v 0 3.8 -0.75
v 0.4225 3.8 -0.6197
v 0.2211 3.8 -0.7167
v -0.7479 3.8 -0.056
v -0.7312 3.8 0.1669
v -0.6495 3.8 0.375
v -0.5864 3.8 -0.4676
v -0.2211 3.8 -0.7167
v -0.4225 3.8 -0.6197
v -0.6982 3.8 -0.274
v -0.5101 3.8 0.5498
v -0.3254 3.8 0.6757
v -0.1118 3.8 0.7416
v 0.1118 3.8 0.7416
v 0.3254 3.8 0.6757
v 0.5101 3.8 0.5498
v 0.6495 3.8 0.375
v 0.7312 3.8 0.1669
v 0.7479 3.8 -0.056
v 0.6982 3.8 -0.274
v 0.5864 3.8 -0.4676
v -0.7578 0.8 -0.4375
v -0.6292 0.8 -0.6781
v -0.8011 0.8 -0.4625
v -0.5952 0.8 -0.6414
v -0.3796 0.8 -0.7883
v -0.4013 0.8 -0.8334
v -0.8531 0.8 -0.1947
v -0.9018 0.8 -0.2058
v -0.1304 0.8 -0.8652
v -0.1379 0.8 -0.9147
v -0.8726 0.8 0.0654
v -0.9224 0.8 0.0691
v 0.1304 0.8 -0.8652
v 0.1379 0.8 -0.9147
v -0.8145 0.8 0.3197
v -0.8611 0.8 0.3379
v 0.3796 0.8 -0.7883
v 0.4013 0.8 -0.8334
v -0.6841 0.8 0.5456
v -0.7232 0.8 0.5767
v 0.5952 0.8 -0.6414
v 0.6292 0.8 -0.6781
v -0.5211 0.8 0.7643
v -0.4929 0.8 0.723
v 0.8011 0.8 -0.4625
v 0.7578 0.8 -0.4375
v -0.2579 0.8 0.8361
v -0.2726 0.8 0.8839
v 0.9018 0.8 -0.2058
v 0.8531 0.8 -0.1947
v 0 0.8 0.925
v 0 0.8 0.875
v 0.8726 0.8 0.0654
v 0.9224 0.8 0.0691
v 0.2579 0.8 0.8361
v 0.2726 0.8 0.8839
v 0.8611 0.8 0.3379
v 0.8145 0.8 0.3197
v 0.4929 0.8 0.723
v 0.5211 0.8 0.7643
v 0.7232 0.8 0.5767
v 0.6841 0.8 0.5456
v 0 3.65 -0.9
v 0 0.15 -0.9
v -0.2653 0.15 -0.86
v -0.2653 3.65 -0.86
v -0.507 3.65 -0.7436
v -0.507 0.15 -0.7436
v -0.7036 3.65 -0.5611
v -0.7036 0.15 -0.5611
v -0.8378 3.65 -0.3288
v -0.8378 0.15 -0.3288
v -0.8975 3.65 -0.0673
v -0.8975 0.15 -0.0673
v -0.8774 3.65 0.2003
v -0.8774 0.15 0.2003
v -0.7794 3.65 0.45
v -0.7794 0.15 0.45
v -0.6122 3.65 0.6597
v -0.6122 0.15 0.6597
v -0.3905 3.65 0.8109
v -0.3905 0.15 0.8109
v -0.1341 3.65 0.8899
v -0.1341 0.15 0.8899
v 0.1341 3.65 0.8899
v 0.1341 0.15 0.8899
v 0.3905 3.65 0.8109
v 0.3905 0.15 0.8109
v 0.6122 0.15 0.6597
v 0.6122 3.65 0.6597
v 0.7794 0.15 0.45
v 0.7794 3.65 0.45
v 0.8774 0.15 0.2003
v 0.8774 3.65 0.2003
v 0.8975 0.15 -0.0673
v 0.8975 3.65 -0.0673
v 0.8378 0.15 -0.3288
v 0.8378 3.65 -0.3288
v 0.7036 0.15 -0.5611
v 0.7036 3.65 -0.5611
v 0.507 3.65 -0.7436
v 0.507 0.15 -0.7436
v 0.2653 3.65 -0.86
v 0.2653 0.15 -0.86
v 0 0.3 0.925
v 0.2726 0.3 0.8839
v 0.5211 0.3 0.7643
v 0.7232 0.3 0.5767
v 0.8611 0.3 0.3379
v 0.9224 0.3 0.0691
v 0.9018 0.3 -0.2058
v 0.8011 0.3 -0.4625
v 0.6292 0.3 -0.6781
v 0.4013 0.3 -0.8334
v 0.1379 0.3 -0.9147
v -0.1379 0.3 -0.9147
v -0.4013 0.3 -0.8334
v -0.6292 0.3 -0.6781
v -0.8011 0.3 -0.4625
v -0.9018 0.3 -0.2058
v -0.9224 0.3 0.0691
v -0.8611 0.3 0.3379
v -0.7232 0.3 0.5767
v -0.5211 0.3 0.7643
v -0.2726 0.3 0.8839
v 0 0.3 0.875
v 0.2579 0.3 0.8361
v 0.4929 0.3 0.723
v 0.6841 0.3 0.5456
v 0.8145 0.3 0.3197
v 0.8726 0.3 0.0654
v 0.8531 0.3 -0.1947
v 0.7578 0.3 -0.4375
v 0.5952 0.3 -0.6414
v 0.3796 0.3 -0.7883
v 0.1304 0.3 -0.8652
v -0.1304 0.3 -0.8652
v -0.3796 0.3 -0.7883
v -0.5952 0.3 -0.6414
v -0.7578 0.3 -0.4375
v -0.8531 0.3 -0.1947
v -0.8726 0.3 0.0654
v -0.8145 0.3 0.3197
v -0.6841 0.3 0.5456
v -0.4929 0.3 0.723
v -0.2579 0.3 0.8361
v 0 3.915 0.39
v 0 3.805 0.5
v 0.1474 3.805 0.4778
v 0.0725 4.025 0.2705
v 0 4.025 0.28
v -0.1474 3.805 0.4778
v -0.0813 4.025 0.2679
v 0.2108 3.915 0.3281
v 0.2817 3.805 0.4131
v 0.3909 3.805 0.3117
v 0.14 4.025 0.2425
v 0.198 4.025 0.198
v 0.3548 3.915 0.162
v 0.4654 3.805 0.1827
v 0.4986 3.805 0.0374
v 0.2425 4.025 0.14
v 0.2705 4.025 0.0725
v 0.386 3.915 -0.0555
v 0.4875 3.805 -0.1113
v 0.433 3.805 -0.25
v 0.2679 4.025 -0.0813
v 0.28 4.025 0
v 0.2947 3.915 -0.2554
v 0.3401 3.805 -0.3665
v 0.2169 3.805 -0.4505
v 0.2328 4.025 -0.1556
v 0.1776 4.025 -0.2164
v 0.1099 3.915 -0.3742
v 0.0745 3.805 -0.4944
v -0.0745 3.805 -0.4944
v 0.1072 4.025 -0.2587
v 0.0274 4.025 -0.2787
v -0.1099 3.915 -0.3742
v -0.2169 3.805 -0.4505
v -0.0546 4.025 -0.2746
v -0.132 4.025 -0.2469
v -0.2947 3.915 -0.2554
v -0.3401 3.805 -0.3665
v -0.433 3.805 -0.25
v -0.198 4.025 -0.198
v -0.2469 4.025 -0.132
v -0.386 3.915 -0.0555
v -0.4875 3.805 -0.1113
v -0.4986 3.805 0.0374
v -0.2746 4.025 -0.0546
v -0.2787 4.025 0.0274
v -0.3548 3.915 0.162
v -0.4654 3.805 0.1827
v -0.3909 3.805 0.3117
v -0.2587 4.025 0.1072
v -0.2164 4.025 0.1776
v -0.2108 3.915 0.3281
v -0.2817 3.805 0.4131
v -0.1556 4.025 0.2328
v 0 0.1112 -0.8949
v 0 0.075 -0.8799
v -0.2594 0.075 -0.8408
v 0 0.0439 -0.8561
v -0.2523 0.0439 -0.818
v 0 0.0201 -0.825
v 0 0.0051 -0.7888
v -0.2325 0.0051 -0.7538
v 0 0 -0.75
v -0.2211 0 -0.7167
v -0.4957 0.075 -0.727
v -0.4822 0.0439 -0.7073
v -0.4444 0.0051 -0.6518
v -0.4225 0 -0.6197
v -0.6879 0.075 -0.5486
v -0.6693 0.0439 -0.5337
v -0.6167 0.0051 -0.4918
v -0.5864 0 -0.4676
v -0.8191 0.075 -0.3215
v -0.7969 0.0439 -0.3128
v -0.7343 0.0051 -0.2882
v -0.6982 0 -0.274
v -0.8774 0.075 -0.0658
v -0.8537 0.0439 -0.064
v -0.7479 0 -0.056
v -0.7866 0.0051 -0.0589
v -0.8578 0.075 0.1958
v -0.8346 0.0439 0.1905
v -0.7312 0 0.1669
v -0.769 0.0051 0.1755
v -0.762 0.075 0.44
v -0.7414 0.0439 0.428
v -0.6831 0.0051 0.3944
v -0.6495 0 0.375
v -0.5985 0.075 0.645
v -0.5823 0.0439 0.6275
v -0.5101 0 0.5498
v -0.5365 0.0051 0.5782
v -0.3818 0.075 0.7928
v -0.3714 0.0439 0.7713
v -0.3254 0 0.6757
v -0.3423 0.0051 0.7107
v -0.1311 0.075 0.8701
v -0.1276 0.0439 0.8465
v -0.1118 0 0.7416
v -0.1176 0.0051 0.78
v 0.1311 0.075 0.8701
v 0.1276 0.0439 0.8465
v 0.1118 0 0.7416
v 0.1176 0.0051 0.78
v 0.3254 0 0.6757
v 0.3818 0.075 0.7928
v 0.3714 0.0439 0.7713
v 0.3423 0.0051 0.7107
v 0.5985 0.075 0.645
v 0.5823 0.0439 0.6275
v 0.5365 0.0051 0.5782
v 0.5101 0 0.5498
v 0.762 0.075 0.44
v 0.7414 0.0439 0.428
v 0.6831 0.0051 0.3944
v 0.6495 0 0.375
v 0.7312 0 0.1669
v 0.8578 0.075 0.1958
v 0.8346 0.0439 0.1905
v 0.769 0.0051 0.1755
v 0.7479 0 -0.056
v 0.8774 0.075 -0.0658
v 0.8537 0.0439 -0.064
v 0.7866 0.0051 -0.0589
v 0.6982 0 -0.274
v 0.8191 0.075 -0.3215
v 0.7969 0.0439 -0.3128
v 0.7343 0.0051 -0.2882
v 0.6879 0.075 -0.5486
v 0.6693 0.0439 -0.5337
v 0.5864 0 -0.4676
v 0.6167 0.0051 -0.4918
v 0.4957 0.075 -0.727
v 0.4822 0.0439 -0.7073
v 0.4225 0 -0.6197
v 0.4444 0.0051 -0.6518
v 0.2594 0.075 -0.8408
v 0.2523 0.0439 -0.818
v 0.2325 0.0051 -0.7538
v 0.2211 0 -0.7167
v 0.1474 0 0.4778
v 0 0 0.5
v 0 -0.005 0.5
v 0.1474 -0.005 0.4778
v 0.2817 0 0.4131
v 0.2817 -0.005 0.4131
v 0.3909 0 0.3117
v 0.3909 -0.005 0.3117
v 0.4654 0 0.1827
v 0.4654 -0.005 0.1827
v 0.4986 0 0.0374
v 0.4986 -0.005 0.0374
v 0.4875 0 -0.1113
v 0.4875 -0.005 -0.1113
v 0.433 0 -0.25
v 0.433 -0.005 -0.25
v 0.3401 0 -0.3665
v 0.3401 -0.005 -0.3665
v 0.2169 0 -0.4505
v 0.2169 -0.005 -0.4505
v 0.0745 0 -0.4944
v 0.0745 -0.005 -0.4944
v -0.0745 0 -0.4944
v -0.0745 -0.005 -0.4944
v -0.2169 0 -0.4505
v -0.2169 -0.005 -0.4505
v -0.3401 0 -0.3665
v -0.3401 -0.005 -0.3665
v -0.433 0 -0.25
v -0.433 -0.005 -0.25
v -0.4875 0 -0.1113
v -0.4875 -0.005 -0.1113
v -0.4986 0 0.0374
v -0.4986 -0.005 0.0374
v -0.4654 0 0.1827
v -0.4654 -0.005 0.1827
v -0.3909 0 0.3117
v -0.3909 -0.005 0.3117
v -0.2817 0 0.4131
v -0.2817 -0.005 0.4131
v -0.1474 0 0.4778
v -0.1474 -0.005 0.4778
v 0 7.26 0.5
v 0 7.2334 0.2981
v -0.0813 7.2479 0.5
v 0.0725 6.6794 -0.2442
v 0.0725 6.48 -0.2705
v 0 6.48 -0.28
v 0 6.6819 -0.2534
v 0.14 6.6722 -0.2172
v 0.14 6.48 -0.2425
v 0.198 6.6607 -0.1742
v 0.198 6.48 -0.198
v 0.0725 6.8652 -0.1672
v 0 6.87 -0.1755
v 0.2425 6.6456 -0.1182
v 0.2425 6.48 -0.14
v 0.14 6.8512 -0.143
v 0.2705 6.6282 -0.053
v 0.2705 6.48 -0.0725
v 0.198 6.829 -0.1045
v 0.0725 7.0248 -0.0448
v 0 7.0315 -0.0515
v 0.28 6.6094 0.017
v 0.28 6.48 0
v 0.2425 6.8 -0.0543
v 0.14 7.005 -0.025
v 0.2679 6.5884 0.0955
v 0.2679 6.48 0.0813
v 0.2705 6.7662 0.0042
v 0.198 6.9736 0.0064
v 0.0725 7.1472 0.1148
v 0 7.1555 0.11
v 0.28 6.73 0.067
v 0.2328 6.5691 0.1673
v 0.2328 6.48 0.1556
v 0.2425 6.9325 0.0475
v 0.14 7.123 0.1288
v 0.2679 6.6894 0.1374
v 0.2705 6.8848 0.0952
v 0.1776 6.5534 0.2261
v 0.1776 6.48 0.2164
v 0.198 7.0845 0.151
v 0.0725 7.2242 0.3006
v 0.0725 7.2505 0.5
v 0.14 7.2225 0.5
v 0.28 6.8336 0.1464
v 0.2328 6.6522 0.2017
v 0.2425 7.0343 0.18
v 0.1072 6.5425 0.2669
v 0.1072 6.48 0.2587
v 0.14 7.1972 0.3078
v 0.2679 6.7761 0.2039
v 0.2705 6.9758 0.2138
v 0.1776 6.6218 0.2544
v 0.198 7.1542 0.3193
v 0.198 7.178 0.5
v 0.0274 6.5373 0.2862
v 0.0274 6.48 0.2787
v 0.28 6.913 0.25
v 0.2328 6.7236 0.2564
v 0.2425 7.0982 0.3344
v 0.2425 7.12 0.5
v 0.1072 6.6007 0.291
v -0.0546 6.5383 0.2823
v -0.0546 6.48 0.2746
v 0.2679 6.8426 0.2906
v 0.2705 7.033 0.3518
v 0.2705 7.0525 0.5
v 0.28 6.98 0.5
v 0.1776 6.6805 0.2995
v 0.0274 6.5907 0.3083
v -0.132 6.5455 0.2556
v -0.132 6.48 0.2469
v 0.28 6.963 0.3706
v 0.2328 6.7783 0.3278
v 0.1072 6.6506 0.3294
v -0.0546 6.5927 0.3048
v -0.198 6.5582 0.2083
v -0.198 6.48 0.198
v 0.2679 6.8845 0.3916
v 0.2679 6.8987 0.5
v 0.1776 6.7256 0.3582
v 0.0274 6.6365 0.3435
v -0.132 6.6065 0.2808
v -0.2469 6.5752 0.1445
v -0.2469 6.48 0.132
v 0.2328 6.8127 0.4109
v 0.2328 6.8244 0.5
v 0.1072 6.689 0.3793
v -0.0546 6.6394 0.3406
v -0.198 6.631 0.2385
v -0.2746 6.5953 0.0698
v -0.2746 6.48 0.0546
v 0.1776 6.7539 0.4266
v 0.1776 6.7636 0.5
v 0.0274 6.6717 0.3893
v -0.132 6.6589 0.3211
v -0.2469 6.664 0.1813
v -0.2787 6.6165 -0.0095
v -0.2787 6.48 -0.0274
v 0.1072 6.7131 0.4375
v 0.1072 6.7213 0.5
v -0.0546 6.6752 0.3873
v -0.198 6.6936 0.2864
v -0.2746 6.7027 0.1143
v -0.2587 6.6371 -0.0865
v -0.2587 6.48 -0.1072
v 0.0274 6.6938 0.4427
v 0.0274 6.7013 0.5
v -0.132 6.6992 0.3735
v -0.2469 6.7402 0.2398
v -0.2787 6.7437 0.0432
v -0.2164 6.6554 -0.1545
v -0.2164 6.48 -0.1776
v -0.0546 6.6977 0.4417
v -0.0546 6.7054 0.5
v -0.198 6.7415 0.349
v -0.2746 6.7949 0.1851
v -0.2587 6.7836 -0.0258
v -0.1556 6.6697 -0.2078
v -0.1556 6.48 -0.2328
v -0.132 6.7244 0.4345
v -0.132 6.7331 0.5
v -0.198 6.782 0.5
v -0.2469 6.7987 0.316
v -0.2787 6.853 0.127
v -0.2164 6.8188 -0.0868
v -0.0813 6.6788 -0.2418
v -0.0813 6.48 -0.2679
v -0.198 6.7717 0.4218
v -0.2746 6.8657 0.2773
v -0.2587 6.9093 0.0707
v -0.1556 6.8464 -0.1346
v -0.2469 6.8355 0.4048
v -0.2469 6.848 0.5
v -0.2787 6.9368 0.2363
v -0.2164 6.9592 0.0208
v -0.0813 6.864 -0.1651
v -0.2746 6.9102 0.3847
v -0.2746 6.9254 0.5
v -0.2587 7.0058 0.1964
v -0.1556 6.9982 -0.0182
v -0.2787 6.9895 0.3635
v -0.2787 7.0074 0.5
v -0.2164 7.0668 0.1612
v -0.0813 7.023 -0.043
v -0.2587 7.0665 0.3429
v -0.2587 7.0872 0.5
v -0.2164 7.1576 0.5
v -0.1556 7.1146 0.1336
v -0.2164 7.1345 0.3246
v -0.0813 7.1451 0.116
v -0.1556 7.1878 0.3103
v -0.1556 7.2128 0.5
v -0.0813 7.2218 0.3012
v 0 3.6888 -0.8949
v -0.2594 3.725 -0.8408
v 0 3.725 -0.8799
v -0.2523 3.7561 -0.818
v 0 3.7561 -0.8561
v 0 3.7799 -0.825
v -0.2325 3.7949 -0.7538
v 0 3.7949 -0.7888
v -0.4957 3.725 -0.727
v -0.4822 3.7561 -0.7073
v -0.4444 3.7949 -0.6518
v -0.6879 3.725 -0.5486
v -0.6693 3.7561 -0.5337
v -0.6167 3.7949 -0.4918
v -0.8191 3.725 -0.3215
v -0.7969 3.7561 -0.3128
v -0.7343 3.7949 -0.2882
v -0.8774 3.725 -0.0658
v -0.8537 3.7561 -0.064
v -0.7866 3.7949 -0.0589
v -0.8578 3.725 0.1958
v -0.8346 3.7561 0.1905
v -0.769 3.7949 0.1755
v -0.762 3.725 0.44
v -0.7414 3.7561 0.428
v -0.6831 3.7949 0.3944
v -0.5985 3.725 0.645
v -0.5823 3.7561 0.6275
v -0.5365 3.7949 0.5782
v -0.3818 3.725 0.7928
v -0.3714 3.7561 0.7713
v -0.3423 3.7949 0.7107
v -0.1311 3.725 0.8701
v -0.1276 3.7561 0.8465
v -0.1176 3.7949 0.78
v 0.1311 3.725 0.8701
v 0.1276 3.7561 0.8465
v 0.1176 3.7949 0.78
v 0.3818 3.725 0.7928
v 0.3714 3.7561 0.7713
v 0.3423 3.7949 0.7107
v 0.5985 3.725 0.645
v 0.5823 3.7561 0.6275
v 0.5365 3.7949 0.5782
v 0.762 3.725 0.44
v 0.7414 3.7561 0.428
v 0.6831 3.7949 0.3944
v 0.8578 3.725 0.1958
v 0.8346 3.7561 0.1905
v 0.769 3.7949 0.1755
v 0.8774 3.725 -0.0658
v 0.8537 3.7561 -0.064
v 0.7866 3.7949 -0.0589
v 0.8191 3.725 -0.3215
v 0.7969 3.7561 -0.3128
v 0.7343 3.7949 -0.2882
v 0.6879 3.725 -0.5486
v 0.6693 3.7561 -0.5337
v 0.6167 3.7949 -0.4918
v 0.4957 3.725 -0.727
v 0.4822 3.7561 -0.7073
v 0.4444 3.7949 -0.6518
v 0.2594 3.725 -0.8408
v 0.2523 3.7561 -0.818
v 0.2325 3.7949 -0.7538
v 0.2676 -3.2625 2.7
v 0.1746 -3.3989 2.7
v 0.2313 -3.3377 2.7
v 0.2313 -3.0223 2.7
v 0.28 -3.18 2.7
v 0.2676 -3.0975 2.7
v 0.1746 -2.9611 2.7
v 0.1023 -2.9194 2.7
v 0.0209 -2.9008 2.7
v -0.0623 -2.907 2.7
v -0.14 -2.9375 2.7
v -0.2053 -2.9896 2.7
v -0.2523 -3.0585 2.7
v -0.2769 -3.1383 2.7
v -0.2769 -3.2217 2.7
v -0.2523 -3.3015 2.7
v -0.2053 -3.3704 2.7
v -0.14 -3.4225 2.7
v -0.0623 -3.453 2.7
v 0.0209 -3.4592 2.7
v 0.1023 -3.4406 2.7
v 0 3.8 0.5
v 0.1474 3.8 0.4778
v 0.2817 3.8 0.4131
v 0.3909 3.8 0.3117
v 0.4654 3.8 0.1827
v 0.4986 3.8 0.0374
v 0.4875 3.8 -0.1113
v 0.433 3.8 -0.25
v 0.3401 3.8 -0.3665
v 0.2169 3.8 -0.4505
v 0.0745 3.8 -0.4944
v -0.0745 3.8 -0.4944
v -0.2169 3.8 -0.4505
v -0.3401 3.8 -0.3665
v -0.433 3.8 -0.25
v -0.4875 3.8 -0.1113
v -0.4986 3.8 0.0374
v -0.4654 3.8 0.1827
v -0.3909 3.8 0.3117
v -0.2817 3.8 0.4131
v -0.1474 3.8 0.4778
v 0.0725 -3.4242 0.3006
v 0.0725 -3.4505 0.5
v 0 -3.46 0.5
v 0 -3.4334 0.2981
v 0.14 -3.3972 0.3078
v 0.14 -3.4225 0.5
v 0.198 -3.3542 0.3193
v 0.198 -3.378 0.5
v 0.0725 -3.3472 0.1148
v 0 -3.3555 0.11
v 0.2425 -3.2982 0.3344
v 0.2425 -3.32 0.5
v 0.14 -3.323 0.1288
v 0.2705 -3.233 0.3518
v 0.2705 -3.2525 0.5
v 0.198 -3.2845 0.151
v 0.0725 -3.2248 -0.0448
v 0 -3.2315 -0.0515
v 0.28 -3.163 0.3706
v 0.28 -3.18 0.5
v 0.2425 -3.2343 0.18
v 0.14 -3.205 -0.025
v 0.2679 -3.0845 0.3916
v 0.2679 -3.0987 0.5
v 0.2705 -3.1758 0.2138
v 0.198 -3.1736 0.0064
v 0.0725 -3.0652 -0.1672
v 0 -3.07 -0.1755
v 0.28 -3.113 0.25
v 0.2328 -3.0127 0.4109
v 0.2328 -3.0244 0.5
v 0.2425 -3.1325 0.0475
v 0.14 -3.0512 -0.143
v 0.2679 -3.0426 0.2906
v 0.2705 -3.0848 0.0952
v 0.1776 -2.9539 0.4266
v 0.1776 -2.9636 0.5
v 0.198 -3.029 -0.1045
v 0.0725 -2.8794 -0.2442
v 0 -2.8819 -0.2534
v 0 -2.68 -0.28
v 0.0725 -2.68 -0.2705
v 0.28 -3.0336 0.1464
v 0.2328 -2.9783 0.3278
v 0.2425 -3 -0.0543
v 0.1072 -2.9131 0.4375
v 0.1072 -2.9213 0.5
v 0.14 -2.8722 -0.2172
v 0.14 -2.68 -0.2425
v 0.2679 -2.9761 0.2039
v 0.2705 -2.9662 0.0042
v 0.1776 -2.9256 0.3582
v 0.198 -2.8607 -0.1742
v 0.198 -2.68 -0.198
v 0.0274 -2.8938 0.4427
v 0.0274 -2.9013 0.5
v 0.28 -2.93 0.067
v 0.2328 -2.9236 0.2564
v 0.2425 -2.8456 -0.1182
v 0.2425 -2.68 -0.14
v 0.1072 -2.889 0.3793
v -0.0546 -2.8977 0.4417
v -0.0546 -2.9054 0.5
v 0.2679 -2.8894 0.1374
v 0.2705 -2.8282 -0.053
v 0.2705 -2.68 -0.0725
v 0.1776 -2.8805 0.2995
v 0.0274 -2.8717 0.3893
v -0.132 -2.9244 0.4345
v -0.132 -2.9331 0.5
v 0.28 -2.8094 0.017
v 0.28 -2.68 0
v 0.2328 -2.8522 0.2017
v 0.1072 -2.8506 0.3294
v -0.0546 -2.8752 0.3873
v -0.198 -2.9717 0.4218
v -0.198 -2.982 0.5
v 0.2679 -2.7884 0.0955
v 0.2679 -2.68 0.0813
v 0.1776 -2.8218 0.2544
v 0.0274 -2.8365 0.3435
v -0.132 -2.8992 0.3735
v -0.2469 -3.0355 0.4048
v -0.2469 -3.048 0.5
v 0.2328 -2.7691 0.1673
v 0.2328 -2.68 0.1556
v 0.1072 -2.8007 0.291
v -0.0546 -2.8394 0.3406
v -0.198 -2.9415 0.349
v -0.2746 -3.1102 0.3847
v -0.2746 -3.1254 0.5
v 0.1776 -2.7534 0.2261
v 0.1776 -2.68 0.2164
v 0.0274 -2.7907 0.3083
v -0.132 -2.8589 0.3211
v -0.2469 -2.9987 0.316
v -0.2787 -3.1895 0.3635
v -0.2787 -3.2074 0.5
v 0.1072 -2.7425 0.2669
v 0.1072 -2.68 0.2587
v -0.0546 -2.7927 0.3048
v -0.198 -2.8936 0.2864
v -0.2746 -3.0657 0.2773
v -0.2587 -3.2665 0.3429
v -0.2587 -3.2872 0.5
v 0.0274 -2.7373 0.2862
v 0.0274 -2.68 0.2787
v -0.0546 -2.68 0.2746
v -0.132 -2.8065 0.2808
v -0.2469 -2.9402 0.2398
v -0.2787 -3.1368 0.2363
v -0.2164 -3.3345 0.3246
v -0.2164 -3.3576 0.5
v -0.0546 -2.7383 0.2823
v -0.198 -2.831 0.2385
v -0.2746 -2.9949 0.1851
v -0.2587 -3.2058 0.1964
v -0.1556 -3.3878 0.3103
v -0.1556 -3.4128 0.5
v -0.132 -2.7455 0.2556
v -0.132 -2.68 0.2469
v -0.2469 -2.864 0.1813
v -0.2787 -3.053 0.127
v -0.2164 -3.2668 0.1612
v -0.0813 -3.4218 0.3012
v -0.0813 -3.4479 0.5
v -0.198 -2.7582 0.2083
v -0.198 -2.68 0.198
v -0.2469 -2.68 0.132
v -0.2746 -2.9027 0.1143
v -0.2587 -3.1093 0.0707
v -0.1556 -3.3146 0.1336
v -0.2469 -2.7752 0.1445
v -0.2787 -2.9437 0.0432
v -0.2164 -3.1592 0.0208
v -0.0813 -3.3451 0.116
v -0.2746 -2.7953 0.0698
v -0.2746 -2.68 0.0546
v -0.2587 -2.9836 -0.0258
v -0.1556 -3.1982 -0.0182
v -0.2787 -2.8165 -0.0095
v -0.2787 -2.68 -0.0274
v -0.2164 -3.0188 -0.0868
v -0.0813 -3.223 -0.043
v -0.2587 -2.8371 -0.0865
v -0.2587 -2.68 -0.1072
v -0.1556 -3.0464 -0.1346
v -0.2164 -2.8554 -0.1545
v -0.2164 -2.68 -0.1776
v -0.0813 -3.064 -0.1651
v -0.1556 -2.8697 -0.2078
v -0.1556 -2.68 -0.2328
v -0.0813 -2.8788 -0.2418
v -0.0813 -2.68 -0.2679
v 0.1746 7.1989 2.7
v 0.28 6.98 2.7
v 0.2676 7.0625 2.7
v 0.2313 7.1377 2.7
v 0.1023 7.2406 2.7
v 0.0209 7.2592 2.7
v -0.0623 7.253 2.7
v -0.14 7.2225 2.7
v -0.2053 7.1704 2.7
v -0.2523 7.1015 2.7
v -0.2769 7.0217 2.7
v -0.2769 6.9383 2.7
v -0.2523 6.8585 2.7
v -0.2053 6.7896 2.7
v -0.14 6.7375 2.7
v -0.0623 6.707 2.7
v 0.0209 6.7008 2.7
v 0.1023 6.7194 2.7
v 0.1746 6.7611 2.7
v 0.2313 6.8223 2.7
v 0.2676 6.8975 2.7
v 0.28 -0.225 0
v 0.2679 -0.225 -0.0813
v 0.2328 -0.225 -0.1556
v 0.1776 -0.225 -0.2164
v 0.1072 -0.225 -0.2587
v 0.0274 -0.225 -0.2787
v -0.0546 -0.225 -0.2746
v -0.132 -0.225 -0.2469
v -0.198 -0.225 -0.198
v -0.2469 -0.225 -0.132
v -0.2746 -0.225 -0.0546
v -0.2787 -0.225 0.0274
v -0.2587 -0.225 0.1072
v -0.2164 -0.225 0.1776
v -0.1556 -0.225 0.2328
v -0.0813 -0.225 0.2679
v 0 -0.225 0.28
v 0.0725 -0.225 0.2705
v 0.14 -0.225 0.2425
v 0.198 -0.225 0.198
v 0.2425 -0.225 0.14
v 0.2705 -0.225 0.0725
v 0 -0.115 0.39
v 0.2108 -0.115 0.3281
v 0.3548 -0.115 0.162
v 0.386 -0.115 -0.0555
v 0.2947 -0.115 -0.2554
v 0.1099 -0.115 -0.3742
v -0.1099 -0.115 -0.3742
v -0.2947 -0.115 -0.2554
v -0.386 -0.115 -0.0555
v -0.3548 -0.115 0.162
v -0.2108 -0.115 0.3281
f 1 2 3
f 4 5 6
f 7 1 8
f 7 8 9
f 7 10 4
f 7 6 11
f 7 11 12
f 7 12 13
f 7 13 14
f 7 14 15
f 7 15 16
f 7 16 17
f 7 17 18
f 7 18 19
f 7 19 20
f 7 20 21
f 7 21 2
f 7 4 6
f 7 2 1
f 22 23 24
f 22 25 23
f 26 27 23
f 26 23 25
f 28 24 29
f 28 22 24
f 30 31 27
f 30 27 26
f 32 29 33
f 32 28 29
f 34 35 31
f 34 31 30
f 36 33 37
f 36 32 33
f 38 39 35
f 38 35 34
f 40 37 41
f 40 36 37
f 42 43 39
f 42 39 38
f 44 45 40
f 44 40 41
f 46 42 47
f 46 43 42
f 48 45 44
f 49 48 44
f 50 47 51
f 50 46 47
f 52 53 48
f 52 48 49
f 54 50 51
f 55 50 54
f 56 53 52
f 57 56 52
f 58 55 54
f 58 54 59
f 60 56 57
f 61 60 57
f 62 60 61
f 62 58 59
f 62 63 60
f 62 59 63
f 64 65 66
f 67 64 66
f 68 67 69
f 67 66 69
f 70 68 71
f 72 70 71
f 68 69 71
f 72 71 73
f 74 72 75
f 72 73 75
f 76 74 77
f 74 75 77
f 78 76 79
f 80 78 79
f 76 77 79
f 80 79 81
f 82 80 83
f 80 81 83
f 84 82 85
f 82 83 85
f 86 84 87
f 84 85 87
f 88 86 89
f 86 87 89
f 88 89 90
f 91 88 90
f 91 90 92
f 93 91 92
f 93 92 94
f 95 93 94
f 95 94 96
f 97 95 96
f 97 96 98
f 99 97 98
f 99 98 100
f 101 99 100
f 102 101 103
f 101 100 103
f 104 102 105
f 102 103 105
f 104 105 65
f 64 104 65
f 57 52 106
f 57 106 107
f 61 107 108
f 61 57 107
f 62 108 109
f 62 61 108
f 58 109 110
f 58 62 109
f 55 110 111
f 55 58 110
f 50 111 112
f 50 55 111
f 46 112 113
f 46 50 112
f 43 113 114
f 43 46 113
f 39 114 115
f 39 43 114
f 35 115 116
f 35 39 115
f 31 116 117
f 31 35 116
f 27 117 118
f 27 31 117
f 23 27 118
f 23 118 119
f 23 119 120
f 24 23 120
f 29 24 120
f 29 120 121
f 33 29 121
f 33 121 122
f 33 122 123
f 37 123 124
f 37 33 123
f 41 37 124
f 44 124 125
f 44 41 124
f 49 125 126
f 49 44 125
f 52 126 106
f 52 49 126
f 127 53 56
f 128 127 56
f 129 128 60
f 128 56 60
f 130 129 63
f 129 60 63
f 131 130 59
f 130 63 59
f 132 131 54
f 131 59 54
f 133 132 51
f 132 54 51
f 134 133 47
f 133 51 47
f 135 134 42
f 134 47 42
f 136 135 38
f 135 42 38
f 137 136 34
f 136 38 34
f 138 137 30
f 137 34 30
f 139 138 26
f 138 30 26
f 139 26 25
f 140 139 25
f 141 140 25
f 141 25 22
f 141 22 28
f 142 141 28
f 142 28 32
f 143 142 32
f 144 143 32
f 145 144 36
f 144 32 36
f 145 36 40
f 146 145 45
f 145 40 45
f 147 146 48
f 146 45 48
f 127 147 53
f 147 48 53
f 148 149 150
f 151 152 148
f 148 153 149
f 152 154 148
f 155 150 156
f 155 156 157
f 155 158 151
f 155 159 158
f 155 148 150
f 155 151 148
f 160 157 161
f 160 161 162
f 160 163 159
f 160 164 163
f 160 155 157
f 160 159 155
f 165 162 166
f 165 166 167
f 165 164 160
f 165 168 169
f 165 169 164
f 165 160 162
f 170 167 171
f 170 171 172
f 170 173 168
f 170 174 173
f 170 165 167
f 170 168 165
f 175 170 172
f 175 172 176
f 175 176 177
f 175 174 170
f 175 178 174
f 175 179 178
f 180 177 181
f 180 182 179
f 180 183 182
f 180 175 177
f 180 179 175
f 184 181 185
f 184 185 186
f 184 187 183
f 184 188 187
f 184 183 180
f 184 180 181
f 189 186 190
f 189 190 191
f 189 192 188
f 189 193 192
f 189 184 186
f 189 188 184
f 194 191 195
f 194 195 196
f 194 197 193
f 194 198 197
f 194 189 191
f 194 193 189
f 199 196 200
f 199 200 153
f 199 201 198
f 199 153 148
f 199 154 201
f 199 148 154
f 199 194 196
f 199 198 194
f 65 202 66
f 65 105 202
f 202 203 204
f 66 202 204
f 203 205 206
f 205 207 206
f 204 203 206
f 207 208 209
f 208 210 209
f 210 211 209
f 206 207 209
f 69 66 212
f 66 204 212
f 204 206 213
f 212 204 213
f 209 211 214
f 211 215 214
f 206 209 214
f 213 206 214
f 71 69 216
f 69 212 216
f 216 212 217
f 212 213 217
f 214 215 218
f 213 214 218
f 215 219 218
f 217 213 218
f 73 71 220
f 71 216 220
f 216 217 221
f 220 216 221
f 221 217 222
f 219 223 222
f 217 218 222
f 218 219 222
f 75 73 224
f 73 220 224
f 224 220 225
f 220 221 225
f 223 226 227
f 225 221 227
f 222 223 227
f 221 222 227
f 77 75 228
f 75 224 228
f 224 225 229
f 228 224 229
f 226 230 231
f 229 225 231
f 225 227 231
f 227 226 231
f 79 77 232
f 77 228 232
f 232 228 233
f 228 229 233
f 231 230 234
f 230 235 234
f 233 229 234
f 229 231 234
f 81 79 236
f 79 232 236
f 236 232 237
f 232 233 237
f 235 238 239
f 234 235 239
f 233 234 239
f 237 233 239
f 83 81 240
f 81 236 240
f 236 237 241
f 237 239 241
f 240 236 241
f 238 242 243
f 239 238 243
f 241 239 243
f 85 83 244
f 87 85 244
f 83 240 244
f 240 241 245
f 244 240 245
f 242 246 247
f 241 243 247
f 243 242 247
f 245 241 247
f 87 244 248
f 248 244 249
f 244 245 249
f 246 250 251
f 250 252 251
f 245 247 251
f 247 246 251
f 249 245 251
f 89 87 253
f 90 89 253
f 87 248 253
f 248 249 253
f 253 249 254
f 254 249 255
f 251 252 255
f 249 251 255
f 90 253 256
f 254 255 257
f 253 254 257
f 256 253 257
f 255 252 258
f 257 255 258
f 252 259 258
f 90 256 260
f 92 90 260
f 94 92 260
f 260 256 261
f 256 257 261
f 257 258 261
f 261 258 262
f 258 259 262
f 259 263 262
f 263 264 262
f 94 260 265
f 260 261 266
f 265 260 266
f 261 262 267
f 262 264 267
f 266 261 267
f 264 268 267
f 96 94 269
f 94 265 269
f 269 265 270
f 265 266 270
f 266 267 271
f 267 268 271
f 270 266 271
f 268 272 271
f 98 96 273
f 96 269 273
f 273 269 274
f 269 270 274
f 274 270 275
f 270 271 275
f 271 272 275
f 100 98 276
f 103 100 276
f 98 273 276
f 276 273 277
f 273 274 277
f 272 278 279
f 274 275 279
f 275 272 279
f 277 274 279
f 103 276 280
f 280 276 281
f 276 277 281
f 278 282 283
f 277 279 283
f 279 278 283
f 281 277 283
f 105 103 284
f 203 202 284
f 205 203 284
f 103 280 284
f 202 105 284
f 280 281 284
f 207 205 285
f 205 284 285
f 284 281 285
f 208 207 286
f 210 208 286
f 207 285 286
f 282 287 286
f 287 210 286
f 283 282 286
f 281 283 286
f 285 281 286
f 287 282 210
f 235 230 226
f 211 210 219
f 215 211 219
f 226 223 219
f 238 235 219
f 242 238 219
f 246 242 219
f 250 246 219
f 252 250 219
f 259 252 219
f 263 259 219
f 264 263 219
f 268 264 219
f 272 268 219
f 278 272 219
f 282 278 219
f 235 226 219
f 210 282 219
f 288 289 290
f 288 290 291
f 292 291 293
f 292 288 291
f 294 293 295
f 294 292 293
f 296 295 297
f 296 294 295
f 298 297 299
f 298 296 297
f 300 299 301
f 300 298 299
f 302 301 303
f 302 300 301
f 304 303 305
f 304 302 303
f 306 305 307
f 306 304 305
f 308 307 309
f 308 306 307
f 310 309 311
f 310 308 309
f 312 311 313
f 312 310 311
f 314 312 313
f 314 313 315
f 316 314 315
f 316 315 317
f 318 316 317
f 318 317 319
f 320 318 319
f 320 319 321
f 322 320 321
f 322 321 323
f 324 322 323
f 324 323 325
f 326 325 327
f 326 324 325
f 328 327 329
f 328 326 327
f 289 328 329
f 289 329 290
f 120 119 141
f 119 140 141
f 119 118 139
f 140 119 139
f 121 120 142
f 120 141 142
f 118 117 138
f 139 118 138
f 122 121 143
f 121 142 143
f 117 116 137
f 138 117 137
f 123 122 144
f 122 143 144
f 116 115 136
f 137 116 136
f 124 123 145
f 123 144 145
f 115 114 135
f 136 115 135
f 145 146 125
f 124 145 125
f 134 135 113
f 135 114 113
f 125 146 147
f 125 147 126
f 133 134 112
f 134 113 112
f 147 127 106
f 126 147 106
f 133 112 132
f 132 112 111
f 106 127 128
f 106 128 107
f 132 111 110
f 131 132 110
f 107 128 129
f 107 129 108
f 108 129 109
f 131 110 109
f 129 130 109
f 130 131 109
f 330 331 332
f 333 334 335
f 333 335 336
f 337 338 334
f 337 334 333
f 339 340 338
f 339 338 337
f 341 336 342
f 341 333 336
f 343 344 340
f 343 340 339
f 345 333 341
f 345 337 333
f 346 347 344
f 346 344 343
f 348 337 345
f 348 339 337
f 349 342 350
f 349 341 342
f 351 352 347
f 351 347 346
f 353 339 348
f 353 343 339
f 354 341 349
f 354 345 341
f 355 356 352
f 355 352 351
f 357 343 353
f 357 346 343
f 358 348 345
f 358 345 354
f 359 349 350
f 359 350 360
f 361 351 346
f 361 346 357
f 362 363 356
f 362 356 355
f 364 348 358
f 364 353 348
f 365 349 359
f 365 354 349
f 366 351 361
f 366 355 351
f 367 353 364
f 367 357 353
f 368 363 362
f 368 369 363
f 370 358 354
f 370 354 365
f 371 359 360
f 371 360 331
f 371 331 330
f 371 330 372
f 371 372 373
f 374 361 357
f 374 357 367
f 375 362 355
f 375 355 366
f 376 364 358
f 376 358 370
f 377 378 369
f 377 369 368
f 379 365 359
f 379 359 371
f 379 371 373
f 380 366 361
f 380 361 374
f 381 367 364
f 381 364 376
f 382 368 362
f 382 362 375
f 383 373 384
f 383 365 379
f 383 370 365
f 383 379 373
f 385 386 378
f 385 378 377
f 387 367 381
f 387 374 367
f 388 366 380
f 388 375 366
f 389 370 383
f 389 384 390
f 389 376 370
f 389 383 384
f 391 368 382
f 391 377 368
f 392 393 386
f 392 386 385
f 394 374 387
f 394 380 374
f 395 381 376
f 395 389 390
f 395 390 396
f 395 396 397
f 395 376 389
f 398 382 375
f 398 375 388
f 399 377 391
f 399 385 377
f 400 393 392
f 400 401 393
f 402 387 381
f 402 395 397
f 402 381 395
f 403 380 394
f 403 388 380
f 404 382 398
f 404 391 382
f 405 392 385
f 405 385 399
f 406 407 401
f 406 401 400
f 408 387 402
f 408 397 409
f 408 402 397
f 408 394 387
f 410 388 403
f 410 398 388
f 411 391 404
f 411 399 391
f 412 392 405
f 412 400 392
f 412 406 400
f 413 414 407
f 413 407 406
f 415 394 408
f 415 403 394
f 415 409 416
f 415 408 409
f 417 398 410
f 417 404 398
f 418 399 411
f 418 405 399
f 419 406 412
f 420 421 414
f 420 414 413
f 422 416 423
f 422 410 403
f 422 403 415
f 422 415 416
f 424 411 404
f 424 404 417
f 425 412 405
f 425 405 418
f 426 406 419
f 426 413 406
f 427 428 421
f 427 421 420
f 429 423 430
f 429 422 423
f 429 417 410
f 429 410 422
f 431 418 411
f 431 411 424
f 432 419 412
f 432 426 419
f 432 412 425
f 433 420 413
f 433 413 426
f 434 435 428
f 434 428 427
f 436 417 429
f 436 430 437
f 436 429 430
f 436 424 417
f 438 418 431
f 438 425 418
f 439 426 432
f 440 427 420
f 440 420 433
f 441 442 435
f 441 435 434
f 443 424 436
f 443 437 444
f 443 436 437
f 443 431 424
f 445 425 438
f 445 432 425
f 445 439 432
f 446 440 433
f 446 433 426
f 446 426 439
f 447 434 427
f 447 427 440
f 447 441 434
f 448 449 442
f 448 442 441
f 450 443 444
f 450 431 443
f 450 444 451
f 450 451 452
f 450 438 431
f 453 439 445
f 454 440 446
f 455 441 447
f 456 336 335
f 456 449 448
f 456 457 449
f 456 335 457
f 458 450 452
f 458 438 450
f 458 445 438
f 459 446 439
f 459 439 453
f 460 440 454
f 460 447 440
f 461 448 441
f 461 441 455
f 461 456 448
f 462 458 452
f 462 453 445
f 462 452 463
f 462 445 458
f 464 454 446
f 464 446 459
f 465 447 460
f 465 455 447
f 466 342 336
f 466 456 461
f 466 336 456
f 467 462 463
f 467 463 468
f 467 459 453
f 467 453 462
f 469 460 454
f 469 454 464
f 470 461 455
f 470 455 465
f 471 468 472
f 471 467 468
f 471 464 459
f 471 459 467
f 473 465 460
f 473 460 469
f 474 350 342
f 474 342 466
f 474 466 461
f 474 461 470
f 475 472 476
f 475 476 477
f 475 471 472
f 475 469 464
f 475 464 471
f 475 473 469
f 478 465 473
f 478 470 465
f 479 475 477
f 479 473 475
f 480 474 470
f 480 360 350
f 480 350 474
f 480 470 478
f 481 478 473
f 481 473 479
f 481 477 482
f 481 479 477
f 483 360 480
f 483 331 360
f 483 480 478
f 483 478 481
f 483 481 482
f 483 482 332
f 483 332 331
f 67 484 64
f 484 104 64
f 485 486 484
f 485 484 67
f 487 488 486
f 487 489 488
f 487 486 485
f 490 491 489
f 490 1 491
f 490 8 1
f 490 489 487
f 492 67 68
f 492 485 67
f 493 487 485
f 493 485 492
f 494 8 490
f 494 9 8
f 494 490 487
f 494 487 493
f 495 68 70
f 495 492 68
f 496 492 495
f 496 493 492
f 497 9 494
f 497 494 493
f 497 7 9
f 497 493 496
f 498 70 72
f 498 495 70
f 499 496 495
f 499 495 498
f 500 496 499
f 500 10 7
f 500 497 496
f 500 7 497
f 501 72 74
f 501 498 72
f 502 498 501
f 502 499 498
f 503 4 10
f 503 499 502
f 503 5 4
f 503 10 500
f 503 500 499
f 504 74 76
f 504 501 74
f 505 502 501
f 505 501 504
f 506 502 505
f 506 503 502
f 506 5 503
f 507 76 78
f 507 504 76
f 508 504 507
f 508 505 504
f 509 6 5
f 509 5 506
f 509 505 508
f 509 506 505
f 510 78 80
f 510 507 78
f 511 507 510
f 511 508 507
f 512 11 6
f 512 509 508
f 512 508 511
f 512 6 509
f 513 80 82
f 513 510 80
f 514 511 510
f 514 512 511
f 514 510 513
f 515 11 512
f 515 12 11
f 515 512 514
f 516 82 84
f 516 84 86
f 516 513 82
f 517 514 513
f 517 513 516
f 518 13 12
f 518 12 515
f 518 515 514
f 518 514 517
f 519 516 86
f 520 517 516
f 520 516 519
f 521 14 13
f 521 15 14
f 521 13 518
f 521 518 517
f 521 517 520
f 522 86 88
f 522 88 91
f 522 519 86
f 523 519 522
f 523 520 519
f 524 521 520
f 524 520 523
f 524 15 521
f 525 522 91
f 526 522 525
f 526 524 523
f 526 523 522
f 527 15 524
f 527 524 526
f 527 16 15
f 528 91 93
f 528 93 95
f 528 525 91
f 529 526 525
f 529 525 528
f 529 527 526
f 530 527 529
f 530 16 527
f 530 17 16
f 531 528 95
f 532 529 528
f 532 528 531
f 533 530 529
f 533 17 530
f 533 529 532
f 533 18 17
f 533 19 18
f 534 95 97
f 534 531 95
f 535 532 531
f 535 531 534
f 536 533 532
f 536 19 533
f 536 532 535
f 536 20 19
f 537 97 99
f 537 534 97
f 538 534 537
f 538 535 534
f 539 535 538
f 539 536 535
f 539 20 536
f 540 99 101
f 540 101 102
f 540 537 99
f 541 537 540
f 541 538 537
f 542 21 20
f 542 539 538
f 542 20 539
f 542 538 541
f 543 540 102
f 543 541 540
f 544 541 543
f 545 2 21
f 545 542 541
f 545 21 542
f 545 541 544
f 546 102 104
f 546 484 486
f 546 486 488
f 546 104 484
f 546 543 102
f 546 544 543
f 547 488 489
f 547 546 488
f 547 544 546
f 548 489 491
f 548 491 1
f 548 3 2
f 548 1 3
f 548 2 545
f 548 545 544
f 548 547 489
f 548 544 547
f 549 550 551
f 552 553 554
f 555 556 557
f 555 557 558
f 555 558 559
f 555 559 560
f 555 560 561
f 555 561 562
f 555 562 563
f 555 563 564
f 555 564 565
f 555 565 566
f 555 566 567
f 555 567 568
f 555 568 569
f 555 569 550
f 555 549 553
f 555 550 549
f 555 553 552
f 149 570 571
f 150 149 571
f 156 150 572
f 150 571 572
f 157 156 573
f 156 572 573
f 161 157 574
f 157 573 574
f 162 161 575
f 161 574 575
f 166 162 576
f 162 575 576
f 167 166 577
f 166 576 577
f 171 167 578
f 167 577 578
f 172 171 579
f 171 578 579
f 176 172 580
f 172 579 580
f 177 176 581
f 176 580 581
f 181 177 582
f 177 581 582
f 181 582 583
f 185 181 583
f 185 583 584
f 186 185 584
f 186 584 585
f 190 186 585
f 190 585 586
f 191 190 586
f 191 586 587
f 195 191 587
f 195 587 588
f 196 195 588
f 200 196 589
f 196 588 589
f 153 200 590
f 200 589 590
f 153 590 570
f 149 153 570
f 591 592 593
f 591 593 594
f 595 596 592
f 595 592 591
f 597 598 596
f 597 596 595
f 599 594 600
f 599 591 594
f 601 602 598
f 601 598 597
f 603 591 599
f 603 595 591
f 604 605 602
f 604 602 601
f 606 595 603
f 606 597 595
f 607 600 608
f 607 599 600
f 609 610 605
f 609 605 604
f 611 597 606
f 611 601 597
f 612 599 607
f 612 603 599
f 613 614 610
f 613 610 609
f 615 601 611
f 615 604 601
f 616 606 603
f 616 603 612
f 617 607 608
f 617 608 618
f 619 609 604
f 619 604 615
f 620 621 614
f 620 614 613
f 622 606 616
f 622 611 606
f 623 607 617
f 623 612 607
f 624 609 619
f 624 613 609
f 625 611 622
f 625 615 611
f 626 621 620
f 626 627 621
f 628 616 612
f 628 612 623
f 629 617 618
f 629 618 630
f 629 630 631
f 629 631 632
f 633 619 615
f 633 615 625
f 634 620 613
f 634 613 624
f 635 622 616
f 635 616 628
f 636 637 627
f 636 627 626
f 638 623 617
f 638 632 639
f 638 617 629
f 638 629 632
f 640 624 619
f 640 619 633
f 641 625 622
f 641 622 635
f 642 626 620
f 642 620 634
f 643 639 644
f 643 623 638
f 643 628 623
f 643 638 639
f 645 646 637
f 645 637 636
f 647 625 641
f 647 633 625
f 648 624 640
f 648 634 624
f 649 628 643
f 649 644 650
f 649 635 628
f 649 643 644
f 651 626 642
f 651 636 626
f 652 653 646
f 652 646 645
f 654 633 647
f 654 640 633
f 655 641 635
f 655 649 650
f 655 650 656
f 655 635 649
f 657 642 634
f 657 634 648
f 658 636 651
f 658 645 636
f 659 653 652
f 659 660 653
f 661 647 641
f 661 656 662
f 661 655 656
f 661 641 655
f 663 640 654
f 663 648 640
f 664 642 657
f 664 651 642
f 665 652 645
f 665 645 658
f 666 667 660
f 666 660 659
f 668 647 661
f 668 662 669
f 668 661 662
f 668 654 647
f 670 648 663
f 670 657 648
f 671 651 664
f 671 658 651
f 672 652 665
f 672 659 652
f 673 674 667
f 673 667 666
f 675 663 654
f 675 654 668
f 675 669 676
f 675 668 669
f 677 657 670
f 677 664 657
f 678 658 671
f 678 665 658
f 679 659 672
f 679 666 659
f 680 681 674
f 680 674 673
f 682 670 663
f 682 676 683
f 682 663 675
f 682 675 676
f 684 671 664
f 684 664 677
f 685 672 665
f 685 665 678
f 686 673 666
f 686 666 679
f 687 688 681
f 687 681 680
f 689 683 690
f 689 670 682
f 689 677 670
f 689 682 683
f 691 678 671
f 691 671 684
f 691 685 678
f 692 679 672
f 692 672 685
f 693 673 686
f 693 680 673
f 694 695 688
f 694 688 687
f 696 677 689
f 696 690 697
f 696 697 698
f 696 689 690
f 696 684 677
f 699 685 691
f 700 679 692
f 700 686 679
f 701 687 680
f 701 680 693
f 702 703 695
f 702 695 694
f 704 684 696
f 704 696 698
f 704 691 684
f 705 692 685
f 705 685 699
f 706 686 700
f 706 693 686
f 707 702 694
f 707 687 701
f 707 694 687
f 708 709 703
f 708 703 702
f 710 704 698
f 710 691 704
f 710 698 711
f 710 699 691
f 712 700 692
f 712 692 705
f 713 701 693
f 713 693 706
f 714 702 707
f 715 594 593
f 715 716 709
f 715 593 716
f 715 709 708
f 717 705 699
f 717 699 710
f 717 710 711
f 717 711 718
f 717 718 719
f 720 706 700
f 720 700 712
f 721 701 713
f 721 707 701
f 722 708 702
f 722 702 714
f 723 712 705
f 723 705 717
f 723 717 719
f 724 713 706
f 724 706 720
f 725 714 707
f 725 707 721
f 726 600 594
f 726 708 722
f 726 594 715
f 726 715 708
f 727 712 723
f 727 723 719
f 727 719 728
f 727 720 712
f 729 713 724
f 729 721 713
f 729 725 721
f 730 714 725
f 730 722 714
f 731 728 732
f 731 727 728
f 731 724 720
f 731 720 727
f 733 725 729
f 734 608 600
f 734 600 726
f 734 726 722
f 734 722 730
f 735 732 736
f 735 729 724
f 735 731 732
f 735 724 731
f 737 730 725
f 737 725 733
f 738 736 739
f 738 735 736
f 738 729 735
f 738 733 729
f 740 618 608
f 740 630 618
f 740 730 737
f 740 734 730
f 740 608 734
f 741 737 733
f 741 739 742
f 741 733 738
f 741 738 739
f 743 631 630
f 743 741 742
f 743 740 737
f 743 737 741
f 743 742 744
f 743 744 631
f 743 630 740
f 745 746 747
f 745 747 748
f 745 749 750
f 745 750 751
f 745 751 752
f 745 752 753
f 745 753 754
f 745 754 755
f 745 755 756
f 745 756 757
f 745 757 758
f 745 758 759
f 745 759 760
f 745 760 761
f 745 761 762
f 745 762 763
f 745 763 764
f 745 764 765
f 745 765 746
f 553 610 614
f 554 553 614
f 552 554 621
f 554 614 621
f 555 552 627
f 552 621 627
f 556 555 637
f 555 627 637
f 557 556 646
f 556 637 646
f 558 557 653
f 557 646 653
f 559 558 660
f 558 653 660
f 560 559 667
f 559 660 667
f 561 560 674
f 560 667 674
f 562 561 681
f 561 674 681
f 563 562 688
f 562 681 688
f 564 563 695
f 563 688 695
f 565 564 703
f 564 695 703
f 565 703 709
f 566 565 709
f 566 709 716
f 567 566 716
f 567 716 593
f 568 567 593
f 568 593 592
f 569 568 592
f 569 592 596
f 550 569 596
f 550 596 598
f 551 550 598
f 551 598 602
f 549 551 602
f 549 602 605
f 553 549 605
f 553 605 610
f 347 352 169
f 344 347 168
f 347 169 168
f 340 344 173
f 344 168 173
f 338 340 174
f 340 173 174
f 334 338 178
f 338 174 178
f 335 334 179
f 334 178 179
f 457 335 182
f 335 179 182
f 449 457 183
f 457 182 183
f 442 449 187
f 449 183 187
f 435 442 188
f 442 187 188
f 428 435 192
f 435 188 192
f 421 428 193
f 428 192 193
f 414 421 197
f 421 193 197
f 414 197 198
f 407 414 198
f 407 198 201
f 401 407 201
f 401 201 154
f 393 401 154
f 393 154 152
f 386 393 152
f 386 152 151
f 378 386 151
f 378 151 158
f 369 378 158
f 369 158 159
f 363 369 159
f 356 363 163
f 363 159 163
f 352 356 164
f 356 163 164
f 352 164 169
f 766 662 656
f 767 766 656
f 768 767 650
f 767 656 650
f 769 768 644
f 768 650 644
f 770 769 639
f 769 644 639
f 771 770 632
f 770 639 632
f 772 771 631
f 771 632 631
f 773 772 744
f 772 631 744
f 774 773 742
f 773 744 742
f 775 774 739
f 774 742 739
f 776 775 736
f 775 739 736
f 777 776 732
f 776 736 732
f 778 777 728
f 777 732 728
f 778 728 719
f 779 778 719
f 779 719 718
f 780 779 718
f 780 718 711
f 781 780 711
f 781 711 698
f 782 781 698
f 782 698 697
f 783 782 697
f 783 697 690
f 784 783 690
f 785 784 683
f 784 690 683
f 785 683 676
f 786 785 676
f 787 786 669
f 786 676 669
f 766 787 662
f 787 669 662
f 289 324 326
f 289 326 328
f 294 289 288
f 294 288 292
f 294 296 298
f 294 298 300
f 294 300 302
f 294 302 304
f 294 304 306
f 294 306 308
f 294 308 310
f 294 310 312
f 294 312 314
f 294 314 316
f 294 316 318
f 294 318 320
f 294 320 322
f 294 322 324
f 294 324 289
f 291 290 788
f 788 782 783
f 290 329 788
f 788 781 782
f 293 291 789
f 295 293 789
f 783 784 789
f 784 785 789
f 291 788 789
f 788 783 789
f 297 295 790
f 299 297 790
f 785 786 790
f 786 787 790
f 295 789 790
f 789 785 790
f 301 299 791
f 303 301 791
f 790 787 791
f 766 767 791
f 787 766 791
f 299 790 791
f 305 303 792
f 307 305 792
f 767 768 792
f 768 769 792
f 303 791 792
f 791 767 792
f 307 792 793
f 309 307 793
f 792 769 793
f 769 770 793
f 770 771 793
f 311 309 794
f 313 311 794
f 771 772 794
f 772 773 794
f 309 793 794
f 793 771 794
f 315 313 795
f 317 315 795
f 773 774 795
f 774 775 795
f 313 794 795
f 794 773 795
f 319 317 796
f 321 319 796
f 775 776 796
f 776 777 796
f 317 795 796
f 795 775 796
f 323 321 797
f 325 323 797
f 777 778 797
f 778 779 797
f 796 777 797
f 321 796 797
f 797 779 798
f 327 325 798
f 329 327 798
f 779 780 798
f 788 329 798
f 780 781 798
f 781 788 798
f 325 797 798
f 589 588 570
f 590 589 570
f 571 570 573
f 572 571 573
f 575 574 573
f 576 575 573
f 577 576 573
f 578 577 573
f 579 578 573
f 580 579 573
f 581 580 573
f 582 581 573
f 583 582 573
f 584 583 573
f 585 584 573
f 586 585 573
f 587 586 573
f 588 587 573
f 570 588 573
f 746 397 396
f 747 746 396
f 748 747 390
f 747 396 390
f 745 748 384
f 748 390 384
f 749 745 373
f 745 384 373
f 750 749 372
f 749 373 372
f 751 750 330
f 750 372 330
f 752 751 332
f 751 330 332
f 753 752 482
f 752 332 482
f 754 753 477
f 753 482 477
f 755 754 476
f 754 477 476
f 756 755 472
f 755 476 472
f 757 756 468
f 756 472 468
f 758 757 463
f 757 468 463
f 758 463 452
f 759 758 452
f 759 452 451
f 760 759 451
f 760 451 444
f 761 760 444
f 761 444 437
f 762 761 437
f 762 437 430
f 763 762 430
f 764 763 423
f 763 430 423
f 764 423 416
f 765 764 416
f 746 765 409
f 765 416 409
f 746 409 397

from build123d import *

# Parameters (mm, degrees)
SKETCH1_R           = 0.9
BOSS_EXTRUDE1_DEPTH = 3.8
SKETCH2_R           = 0.5
BOSS_EXTRUDE2_DEPTH = 0.225
CHAMFER2_SIZE       = 0.22
FILLET1_R           = 0.15
FILLET2_R           = 0.15
SKETCH10_R          = 0.925
SKETCH10_R_2        = 0.875
BOSS_EXTRUDE9_DEPTH = 0.5
BARRER1_OUTLINE_R   = 0.28
BARRER1_ANGLE       = 90
BARRER1_START       = -2.6800001
BARRER1_2_OUTLINE_R = 0.28
BARRER1_2_DEPTH     = 2.4550001
BARRER1_START_2     = 0.4999999
BARRER1_3_OUTLINE_R = 0.28
BARRER1_3_DEPTH     = 2.2000001
BARRER2_OUTLINE_R   = 0.28
BARRER2_ANGLE       = 90
BARRER2_START       = 4.025
BARRER2_2_OUTLINE_R = 0.28
BARRER2_2_DEPTH     = 2.4550001
BARRER2_START_2     = 0.4999999
BARRER2_3_OUTLINE_R = 0.28
BARRER2_3_DEPTH     = 2.2000001


with BuildPart() as part:
    # Sketch1 → Boss-Extrude1 (new body)
    with BuildSketch(Plane(origin=(0, 0, 0), x_dir=(1, 0, 0), z_dir=(0, 1, 0))):
        with Locations(Location((0, 0, 0), (0, 0, 90))):
            Circle(SKETCH1_R)
    extrude(amount=BOSS_EXTRUDE1_DEPTH)

    # Fillet1
    fillet1_edges = [part.edges().sort_by_distance(p)[0] for p in [
        (0, 3.8, 0.9),
    ]]
    fillet(fillet1_edges, radius=FILLET1_R)

    # Fillet2
    fillet2_edges = [part.edges().sort_by_distance(p)[0] for p in [
        (0, 0, 0.9),
    ]]
    fillet(fillet2_edges, radius=FILLET2_R)


with BuildPart() as body_2:
    # Sketch2 → Boss-Extrude2 (new body)
    with BuildSketch(Plane(origin=(0, 3.8, 0), x_dir=(1, 0, 0), z_dir=(0, 1, 0))):
        with Locations(Location((0, 0, 0), (0, 0, 270))):
            Circle(SKETCH2_R)
    extrude(amount=BOSS_EXTRUDE2_DEPTH)

    # Chamfer2
    chamfer2_edges = [body_2.edges().sort_by_distance(p)[0] for p in [
        (0, 4.025, -0.5),
    ]]
    chamfer(chamfer2_edges, length=CHAMFER2_SIZE)


with BuildPart() as body_3:
    # Mirror1: mirrored copy
    add(body_2.part.mirror(Plane.ZX.offset(1.9)))

    # Barrer1: read off the stored shape, not the designer's step
    # Barrer1 outline → Barrer1 (revolve)
    with BuildSketch(Plane(origin=(0, -2.68, 0.5), x_dir=(0, -1, 0), z_dir=(0, 0, 1))):
        with Locations((0.5, 0)):
            Circle(BARRER1_OUTLINE_R)
    revolve(axis=Axis((0, -2.68, 0.5), (1, 0, 0)), revolution_arc=BARRER1_ANGLE)

    # Barrer1 2 outline → Barrer1 2 (add)
    with BuildSketch(Plane(origin=(0, 0, 0), x_dir=(1, 0, 0), z_dir=(0, 1, 0)).offset(BARRER1_START)):
        Circle(BARRER1_2_OUTLINE_R)
    extrude(amount=BARRER1_2_DEPTH)

    # Barrer1 3 outline → Barrer1 3 (add)
    with BuildSketch(Plane.XY.offset(BARRER1_START_2)):
        with Locations((0, -3.18)):
            Circle(BARRER1_3_OUTLINE_R)
    extrude(amount=BARRER1_3_DEPTH)


with BuildPart() as body_4:
    # Sketch10 → Boss-Extrude9 (new body)
    with BuildSketch(Plane(origin=(0, 0.8, 0), x_dir=(-1, 0, 0), z_dir=(0, 1, 0))):
        with Locations(Location((0, 0, 0), (0, 0, 90))):
            Circle(SKETCH10_R)
        with Locations(Location((0, 0, 0), (0, 0, 90))):
            Circle(SKETCH10_R_2, mode=Mode.SUBTRACT)
    extrude(amount=-BOSS_EXTRUDE9_DEPTH)


with BuildPart() as body_2_1:
    add(body_2.part)

    # Barrer2: read off the stored shape, not the designer's step
    # Barrer2 outline → Barrer2 (revolve)
    with BuildSketch(Plane(origin=(0, 6.48, 0.5), x_dir=(0, 0, -1), z_dir=(0, -1, 0))):
        with Locations((0.5, 0)):
            Circle(BARRER2_OUTLINE_R)
    revolve(axis=Axis((0, 6.48, 0.5), (1, 0, 0)), revolution_arc=BARRER2_ANGLE)

    # Barrer2 2 outline → Barrer2 2 (add)
    with BuildSketch(Plane(origin=(0, 0, 0), x_dir=(1, 0, 0), z_dir=(0, 1, 0)).offset(BARRER2_START)):
        Circle(BARRER2_2_OUTLINE_R)
    extrude(amount=BARRER2_2_DEPTH)

    # Barrer2 3 outline → Barrer2 3 (add)
    with BuildSketch(Plane.XY.offset(BARRER2_START_2)):
        with Locations((0, 6.98)):
            Circle(BARRER2_3_OUTLINE_R)
    extrude(amount=BARRER2_3_DEPTH)


solid = Compound([part.part, body_3.part, body_4.part, body_2_1.part])
